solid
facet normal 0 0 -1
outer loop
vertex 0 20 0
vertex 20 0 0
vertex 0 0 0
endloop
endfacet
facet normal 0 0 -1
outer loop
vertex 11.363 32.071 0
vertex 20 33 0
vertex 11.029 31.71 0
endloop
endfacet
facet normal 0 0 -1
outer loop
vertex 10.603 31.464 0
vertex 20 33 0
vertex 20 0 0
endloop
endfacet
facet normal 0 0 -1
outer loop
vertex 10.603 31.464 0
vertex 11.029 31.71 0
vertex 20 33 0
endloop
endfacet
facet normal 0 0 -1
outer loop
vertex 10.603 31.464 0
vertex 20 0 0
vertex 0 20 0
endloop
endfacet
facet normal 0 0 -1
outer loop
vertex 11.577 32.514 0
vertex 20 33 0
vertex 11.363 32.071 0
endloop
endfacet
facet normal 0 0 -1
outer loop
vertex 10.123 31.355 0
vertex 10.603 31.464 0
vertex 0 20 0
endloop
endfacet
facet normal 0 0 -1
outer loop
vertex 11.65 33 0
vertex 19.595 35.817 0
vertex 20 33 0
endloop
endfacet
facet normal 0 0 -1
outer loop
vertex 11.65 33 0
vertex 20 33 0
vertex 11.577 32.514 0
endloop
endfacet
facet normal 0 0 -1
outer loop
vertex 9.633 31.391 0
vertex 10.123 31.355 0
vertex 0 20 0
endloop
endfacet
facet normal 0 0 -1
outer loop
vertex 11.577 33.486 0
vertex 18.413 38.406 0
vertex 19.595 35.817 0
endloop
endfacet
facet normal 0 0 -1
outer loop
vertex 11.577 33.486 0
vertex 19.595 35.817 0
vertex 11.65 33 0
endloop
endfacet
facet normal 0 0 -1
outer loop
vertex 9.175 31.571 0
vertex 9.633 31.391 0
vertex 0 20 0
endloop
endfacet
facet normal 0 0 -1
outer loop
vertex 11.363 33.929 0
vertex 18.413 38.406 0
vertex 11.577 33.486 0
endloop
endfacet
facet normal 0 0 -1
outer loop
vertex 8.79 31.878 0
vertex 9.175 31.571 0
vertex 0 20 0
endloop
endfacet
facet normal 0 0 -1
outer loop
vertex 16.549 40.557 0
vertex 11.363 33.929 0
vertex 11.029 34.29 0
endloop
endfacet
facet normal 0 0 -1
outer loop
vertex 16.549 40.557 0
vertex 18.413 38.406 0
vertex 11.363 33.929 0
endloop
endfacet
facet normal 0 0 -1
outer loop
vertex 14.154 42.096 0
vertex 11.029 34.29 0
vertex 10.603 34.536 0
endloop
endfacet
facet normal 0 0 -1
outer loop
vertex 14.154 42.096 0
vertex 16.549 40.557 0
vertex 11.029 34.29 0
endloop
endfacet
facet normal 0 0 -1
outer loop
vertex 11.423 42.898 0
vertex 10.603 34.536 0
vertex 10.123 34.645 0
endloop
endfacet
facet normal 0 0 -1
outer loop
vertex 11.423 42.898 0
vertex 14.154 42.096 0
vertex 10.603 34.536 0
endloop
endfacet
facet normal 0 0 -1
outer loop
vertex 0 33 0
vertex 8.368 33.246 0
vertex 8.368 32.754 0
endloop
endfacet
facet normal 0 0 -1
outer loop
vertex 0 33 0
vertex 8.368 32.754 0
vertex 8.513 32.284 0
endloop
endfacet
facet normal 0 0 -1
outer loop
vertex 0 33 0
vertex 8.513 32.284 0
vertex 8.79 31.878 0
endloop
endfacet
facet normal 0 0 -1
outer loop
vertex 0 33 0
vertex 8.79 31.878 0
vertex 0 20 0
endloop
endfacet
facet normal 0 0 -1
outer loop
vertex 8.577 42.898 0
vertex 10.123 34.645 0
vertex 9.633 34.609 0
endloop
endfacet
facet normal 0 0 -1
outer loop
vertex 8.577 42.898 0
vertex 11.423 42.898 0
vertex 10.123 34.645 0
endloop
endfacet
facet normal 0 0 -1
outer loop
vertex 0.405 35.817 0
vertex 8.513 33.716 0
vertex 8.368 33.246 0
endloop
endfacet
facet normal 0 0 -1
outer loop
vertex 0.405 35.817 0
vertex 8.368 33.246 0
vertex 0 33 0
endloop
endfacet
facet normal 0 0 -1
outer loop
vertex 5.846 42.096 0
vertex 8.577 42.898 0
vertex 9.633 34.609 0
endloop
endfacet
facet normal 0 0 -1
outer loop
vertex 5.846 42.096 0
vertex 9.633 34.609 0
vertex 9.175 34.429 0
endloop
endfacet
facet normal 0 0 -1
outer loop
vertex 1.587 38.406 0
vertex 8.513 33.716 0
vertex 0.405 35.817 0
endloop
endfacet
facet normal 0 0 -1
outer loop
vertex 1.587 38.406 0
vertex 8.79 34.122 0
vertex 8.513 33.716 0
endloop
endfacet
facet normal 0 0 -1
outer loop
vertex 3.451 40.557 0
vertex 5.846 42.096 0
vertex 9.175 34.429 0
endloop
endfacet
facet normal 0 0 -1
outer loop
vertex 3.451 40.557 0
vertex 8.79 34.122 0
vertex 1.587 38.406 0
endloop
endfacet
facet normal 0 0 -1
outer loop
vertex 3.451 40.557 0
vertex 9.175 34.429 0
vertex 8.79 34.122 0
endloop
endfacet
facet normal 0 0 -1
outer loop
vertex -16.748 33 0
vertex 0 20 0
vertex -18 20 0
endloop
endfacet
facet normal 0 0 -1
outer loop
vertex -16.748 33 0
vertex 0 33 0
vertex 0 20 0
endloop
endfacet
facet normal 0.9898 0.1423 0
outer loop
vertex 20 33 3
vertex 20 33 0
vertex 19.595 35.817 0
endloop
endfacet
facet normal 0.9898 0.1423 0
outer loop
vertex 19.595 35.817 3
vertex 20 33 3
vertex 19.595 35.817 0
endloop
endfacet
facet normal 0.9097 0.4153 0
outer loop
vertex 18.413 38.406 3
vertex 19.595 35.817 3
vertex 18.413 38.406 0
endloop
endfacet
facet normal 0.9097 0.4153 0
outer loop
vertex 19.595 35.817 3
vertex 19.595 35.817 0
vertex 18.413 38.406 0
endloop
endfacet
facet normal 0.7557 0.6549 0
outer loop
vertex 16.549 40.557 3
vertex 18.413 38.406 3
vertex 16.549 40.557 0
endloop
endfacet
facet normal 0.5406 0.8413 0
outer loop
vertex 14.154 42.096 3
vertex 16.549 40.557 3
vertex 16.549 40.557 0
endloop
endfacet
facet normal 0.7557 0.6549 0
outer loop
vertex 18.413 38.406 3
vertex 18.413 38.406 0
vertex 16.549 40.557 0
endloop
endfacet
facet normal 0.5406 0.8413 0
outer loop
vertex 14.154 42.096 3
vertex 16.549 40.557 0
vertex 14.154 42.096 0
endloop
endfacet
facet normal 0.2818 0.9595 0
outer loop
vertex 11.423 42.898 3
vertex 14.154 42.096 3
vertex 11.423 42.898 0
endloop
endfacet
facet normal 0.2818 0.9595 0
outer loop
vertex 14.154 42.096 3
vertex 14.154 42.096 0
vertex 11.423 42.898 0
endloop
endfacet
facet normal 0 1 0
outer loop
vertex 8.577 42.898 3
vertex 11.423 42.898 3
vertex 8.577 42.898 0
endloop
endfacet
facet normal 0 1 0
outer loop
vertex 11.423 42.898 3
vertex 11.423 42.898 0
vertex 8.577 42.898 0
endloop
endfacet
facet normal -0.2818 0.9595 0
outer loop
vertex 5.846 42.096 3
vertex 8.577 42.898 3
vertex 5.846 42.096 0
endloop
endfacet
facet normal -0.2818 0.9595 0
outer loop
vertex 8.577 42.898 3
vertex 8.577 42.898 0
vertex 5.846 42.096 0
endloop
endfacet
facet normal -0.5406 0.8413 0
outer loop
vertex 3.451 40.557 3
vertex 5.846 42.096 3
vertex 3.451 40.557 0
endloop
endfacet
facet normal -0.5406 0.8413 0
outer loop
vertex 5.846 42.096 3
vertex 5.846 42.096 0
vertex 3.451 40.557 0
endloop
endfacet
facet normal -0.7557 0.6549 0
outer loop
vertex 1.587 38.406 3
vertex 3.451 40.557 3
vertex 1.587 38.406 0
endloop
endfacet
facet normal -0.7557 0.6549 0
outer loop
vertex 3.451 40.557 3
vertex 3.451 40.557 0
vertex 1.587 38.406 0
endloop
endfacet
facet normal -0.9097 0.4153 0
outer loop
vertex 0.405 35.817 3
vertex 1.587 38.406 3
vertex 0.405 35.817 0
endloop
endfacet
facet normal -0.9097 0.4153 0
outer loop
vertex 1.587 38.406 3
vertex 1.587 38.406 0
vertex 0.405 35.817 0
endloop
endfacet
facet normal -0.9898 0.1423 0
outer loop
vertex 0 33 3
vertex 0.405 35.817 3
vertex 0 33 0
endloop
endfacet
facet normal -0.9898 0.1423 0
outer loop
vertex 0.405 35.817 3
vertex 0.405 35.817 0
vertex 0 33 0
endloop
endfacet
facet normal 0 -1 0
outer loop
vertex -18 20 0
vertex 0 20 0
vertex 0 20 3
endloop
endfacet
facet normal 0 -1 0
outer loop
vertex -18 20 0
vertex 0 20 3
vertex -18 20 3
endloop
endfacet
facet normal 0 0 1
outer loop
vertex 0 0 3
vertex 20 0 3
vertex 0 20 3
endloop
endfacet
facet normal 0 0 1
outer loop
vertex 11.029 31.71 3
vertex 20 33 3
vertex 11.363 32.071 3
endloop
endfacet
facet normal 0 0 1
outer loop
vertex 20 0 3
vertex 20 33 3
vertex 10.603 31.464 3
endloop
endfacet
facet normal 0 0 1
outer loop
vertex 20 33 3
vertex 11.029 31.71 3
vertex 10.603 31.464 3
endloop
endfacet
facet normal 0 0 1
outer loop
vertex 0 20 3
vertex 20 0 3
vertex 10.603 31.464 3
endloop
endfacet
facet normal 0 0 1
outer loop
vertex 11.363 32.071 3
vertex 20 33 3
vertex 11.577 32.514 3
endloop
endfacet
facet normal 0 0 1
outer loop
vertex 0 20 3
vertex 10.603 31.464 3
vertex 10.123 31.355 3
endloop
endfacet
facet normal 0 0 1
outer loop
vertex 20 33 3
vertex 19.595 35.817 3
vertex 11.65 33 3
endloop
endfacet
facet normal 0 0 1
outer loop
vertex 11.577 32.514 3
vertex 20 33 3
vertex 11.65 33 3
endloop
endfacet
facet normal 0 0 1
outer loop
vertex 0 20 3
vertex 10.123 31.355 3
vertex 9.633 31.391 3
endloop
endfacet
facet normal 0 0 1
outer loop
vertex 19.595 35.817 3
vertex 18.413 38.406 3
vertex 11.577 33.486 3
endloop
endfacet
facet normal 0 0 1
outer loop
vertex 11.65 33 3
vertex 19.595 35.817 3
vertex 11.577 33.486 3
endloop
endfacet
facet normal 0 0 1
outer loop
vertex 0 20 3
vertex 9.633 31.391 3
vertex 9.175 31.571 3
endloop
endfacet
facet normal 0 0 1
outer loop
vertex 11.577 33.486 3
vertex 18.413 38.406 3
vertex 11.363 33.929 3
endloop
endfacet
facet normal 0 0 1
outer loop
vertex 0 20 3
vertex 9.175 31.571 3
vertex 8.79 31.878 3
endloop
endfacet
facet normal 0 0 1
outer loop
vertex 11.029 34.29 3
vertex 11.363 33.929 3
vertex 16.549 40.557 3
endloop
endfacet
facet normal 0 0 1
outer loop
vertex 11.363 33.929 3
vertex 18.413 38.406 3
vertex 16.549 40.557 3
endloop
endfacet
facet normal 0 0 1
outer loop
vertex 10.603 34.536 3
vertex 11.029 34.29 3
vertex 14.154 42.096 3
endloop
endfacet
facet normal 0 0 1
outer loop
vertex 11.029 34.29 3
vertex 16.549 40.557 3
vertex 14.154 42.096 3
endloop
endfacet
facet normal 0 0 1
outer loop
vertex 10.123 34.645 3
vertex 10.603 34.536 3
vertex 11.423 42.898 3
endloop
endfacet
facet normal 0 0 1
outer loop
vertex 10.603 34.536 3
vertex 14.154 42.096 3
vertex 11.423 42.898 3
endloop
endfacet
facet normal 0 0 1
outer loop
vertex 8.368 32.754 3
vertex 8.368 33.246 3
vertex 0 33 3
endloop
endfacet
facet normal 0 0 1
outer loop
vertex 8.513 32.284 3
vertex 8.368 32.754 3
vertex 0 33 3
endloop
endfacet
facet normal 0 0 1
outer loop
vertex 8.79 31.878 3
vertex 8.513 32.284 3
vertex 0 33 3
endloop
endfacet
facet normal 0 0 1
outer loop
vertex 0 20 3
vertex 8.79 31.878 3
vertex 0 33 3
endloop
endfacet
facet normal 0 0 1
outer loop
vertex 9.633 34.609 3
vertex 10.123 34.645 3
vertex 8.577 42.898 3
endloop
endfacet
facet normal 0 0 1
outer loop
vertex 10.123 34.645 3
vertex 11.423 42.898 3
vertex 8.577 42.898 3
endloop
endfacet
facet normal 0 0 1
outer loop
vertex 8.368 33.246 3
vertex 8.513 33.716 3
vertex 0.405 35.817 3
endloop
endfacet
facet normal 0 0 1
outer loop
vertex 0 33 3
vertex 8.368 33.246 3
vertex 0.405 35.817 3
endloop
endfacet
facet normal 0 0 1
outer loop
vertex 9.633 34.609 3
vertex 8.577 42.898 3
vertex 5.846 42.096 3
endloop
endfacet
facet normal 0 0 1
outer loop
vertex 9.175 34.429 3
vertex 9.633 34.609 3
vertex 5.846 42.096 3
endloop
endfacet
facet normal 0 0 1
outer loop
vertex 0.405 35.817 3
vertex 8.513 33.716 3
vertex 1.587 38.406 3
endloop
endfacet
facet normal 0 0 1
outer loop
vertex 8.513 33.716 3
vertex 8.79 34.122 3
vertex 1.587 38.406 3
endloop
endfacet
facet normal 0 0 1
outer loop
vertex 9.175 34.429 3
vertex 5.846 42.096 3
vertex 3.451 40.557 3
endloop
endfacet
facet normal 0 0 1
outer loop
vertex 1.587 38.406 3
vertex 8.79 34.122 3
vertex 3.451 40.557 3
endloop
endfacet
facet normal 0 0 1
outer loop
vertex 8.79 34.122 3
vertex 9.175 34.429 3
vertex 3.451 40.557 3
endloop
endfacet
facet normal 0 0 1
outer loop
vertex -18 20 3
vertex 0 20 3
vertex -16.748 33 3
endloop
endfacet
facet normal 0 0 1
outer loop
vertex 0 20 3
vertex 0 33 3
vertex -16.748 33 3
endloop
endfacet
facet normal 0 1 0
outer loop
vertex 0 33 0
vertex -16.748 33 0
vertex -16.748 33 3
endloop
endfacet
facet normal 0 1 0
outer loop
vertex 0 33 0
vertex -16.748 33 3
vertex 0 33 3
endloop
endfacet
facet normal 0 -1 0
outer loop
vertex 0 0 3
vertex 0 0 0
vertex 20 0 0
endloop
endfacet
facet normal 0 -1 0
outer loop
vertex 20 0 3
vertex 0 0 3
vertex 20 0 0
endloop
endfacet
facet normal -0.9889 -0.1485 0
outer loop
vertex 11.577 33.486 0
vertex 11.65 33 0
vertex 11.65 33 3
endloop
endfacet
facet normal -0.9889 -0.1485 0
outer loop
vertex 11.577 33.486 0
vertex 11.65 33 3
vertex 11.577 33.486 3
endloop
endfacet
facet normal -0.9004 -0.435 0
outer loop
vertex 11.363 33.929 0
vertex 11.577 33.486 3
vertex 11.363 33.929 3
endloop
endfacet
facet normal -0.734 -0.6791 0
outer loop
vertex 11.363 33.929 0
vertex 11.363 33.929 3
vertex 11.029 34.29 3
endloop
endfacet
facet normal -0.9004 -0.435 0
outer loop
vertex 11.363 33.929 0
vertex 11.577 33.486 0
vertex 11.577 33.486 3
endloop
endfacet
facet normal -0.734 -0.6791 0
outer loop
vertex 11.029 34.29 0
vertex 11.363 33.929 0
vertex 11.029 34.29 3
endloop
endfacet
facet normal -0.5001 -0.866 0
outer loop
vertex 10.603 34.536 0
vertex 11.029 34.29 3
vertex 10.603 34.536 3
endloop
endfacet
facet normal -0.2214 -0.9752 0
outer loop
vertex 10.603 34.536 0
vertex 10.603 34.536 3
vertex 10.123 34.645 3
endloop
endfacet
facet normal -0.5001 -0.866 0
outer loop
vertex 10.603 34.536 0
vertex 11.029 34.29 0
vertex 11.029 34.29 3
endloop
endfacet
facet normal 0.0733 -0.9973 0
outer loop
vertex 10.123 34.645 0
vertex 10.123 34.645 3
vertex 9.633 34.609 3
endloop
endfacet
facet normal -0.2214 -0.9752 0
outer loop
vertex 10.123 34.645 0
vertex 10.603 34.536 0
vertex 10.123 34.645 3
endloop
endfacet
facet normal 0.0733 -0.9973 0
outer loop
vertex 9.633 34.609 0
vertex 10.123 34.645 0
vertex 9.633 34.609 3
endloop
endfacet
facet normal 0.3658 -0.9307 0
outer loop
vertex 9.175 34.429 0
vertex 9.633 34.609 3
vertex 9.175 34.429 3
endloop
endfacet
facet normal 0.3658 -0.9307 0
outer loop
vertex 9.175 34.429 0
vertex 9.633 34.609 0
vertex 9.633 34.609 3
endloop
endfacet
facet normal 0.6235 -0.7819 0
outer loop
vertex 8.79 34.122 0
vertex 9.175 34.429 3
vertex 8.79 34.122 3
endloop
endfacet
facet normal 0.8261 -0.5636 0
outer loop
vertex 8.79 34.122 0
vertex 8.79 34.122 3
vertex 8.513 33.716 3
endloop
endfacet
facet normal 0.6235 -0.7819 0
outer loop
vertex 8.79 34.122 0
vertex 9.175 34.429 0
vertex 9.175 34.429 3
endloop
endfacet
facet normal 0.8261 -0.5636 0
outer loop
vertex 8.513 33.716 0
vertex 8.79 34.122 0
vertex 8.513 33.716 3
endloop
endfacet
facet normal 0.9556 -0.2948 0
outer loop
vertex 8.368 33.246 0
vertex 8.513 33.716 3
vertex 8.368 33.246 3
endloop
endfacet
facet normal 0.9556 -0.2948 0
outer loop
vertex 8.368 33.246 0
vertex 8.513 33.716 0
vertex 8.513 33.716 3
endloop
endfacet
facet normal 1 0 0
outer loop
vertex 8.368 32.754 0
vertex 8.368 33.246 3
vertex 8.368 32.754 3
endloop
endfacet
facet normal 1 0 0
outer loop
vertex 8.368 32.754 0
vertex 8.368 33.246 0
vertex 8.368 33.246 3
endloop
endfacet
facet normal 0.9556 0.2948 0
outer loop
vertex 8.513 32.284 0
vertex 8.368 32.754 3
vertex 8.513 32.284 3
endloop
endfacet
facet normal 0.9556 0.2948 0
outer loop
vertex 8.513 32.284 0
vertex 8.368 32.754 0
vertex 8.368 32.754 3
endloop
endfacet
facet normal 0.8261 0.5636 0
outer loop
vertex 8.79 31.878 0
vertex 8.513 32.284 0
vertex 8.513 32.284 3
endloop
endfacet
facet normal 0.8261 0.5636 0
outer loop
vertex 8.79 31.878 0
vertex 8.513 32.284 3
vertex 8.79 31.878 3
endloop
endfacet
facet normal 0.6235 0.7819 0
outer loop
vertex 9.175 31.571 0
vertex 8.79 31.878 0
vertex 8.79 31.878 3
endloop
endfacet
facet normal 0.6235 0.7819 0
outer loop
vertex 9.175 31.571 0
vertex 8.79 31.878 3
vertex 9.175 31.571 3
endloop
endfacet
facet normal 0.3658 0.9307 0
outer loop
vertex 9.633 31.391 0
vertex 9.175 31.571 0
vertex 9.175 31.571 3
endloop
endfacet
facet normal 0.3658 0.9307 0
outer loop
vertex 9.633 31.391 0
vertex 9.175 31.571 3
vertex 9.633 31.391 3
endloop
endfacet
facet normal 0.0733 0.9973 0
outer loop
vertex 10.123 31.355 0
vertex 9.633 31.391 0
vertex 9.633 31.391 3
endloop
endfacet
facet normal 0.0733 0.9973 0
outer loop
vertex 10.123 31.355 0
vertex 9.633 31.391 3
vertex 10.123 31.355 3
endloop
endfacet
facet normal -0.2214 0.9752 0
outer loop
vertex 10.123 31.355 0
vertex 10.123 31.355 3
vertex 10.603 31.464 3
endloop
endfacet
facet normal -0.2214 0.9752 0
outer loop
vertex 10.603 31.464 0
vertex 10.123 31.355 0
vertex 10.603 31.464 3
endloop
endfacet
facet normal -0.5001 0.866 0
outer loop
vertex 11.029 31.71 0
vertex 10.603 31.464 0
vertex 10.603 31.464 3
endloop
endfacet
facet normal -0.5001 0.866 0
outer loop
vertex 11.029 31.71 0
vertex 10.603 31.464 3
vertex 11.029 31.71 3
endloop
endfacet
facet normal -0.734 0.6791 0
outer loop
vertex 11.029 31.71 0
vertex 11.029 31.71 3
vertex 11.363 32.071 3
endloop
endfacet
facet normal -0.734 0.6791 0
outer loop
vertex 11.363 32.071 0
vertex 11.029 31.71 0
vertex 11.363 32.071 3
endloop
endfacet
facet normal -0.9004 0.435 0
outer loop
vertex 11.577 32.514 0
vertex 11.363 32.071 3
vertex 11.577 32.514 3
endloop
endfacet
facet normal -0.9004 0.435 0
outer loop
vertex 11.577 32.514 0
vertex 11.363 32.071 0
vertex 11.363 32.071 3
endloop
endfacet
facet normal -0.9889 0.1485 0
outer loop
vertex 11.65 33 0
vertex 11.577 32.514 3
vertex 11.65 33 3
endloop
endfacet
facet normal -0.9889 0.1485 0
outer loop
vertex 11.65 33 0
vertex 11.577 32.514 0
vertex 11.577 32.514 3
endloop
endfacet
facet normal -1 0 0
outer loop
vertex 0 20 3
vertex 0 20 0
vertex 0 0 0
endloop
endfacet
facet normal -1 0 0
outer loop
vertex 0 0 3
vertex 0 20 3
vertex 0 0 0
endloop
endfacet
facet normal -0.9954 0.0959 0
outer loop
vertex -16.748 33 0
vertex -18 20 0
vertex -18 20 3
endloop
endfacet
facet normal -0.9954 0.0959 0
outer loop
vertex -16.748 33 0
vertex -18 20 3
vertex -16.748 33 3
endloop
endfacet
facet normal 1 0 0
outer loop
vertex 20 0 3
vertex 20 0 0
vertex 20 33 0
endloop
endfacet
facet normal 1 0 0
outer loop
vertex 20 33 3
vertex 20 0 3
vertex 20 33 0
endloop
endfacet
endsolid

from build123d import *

# Parameters (mm, degrees)
SKETCH_1_R      = 1.65
EXTRUDE_1_DEPTH = 3
EXTRUDE_2_DEPTH = 3


with BuildPart() as part:
    # 草图1 → 凸台-拉伸1 (new body)
    with BuildSketch(Plane.XY):
        with BuildLine():
            Line((0, 0), (20, 0))
            Line((20, 0), (20, 33))
            ThreePointArc((20, 33), (10, 43), (0, 33))
            Line((0, 33), (0, 0))
        make_face()
        with Locations((10, 33)):
            Circle(SKETCH_1_R, mode=Mode.SUBTRACT)
    extrude(amount=EXTRUDE_1_DEPTH)

    # 草图5 → 凸台-拉伸2 (add)
    with BuildSketch(Plane(origin=(0, 0, 0), x_dir=(-1, 0, 0), z_dir=(0, 0, -1))):
        Polygon((0, 33), (0, 20), (18, 20), (16.748242373, 33), align=None)
    extrude(amount=-EXTRUDE_2_DEPTH)


solid = part.part
